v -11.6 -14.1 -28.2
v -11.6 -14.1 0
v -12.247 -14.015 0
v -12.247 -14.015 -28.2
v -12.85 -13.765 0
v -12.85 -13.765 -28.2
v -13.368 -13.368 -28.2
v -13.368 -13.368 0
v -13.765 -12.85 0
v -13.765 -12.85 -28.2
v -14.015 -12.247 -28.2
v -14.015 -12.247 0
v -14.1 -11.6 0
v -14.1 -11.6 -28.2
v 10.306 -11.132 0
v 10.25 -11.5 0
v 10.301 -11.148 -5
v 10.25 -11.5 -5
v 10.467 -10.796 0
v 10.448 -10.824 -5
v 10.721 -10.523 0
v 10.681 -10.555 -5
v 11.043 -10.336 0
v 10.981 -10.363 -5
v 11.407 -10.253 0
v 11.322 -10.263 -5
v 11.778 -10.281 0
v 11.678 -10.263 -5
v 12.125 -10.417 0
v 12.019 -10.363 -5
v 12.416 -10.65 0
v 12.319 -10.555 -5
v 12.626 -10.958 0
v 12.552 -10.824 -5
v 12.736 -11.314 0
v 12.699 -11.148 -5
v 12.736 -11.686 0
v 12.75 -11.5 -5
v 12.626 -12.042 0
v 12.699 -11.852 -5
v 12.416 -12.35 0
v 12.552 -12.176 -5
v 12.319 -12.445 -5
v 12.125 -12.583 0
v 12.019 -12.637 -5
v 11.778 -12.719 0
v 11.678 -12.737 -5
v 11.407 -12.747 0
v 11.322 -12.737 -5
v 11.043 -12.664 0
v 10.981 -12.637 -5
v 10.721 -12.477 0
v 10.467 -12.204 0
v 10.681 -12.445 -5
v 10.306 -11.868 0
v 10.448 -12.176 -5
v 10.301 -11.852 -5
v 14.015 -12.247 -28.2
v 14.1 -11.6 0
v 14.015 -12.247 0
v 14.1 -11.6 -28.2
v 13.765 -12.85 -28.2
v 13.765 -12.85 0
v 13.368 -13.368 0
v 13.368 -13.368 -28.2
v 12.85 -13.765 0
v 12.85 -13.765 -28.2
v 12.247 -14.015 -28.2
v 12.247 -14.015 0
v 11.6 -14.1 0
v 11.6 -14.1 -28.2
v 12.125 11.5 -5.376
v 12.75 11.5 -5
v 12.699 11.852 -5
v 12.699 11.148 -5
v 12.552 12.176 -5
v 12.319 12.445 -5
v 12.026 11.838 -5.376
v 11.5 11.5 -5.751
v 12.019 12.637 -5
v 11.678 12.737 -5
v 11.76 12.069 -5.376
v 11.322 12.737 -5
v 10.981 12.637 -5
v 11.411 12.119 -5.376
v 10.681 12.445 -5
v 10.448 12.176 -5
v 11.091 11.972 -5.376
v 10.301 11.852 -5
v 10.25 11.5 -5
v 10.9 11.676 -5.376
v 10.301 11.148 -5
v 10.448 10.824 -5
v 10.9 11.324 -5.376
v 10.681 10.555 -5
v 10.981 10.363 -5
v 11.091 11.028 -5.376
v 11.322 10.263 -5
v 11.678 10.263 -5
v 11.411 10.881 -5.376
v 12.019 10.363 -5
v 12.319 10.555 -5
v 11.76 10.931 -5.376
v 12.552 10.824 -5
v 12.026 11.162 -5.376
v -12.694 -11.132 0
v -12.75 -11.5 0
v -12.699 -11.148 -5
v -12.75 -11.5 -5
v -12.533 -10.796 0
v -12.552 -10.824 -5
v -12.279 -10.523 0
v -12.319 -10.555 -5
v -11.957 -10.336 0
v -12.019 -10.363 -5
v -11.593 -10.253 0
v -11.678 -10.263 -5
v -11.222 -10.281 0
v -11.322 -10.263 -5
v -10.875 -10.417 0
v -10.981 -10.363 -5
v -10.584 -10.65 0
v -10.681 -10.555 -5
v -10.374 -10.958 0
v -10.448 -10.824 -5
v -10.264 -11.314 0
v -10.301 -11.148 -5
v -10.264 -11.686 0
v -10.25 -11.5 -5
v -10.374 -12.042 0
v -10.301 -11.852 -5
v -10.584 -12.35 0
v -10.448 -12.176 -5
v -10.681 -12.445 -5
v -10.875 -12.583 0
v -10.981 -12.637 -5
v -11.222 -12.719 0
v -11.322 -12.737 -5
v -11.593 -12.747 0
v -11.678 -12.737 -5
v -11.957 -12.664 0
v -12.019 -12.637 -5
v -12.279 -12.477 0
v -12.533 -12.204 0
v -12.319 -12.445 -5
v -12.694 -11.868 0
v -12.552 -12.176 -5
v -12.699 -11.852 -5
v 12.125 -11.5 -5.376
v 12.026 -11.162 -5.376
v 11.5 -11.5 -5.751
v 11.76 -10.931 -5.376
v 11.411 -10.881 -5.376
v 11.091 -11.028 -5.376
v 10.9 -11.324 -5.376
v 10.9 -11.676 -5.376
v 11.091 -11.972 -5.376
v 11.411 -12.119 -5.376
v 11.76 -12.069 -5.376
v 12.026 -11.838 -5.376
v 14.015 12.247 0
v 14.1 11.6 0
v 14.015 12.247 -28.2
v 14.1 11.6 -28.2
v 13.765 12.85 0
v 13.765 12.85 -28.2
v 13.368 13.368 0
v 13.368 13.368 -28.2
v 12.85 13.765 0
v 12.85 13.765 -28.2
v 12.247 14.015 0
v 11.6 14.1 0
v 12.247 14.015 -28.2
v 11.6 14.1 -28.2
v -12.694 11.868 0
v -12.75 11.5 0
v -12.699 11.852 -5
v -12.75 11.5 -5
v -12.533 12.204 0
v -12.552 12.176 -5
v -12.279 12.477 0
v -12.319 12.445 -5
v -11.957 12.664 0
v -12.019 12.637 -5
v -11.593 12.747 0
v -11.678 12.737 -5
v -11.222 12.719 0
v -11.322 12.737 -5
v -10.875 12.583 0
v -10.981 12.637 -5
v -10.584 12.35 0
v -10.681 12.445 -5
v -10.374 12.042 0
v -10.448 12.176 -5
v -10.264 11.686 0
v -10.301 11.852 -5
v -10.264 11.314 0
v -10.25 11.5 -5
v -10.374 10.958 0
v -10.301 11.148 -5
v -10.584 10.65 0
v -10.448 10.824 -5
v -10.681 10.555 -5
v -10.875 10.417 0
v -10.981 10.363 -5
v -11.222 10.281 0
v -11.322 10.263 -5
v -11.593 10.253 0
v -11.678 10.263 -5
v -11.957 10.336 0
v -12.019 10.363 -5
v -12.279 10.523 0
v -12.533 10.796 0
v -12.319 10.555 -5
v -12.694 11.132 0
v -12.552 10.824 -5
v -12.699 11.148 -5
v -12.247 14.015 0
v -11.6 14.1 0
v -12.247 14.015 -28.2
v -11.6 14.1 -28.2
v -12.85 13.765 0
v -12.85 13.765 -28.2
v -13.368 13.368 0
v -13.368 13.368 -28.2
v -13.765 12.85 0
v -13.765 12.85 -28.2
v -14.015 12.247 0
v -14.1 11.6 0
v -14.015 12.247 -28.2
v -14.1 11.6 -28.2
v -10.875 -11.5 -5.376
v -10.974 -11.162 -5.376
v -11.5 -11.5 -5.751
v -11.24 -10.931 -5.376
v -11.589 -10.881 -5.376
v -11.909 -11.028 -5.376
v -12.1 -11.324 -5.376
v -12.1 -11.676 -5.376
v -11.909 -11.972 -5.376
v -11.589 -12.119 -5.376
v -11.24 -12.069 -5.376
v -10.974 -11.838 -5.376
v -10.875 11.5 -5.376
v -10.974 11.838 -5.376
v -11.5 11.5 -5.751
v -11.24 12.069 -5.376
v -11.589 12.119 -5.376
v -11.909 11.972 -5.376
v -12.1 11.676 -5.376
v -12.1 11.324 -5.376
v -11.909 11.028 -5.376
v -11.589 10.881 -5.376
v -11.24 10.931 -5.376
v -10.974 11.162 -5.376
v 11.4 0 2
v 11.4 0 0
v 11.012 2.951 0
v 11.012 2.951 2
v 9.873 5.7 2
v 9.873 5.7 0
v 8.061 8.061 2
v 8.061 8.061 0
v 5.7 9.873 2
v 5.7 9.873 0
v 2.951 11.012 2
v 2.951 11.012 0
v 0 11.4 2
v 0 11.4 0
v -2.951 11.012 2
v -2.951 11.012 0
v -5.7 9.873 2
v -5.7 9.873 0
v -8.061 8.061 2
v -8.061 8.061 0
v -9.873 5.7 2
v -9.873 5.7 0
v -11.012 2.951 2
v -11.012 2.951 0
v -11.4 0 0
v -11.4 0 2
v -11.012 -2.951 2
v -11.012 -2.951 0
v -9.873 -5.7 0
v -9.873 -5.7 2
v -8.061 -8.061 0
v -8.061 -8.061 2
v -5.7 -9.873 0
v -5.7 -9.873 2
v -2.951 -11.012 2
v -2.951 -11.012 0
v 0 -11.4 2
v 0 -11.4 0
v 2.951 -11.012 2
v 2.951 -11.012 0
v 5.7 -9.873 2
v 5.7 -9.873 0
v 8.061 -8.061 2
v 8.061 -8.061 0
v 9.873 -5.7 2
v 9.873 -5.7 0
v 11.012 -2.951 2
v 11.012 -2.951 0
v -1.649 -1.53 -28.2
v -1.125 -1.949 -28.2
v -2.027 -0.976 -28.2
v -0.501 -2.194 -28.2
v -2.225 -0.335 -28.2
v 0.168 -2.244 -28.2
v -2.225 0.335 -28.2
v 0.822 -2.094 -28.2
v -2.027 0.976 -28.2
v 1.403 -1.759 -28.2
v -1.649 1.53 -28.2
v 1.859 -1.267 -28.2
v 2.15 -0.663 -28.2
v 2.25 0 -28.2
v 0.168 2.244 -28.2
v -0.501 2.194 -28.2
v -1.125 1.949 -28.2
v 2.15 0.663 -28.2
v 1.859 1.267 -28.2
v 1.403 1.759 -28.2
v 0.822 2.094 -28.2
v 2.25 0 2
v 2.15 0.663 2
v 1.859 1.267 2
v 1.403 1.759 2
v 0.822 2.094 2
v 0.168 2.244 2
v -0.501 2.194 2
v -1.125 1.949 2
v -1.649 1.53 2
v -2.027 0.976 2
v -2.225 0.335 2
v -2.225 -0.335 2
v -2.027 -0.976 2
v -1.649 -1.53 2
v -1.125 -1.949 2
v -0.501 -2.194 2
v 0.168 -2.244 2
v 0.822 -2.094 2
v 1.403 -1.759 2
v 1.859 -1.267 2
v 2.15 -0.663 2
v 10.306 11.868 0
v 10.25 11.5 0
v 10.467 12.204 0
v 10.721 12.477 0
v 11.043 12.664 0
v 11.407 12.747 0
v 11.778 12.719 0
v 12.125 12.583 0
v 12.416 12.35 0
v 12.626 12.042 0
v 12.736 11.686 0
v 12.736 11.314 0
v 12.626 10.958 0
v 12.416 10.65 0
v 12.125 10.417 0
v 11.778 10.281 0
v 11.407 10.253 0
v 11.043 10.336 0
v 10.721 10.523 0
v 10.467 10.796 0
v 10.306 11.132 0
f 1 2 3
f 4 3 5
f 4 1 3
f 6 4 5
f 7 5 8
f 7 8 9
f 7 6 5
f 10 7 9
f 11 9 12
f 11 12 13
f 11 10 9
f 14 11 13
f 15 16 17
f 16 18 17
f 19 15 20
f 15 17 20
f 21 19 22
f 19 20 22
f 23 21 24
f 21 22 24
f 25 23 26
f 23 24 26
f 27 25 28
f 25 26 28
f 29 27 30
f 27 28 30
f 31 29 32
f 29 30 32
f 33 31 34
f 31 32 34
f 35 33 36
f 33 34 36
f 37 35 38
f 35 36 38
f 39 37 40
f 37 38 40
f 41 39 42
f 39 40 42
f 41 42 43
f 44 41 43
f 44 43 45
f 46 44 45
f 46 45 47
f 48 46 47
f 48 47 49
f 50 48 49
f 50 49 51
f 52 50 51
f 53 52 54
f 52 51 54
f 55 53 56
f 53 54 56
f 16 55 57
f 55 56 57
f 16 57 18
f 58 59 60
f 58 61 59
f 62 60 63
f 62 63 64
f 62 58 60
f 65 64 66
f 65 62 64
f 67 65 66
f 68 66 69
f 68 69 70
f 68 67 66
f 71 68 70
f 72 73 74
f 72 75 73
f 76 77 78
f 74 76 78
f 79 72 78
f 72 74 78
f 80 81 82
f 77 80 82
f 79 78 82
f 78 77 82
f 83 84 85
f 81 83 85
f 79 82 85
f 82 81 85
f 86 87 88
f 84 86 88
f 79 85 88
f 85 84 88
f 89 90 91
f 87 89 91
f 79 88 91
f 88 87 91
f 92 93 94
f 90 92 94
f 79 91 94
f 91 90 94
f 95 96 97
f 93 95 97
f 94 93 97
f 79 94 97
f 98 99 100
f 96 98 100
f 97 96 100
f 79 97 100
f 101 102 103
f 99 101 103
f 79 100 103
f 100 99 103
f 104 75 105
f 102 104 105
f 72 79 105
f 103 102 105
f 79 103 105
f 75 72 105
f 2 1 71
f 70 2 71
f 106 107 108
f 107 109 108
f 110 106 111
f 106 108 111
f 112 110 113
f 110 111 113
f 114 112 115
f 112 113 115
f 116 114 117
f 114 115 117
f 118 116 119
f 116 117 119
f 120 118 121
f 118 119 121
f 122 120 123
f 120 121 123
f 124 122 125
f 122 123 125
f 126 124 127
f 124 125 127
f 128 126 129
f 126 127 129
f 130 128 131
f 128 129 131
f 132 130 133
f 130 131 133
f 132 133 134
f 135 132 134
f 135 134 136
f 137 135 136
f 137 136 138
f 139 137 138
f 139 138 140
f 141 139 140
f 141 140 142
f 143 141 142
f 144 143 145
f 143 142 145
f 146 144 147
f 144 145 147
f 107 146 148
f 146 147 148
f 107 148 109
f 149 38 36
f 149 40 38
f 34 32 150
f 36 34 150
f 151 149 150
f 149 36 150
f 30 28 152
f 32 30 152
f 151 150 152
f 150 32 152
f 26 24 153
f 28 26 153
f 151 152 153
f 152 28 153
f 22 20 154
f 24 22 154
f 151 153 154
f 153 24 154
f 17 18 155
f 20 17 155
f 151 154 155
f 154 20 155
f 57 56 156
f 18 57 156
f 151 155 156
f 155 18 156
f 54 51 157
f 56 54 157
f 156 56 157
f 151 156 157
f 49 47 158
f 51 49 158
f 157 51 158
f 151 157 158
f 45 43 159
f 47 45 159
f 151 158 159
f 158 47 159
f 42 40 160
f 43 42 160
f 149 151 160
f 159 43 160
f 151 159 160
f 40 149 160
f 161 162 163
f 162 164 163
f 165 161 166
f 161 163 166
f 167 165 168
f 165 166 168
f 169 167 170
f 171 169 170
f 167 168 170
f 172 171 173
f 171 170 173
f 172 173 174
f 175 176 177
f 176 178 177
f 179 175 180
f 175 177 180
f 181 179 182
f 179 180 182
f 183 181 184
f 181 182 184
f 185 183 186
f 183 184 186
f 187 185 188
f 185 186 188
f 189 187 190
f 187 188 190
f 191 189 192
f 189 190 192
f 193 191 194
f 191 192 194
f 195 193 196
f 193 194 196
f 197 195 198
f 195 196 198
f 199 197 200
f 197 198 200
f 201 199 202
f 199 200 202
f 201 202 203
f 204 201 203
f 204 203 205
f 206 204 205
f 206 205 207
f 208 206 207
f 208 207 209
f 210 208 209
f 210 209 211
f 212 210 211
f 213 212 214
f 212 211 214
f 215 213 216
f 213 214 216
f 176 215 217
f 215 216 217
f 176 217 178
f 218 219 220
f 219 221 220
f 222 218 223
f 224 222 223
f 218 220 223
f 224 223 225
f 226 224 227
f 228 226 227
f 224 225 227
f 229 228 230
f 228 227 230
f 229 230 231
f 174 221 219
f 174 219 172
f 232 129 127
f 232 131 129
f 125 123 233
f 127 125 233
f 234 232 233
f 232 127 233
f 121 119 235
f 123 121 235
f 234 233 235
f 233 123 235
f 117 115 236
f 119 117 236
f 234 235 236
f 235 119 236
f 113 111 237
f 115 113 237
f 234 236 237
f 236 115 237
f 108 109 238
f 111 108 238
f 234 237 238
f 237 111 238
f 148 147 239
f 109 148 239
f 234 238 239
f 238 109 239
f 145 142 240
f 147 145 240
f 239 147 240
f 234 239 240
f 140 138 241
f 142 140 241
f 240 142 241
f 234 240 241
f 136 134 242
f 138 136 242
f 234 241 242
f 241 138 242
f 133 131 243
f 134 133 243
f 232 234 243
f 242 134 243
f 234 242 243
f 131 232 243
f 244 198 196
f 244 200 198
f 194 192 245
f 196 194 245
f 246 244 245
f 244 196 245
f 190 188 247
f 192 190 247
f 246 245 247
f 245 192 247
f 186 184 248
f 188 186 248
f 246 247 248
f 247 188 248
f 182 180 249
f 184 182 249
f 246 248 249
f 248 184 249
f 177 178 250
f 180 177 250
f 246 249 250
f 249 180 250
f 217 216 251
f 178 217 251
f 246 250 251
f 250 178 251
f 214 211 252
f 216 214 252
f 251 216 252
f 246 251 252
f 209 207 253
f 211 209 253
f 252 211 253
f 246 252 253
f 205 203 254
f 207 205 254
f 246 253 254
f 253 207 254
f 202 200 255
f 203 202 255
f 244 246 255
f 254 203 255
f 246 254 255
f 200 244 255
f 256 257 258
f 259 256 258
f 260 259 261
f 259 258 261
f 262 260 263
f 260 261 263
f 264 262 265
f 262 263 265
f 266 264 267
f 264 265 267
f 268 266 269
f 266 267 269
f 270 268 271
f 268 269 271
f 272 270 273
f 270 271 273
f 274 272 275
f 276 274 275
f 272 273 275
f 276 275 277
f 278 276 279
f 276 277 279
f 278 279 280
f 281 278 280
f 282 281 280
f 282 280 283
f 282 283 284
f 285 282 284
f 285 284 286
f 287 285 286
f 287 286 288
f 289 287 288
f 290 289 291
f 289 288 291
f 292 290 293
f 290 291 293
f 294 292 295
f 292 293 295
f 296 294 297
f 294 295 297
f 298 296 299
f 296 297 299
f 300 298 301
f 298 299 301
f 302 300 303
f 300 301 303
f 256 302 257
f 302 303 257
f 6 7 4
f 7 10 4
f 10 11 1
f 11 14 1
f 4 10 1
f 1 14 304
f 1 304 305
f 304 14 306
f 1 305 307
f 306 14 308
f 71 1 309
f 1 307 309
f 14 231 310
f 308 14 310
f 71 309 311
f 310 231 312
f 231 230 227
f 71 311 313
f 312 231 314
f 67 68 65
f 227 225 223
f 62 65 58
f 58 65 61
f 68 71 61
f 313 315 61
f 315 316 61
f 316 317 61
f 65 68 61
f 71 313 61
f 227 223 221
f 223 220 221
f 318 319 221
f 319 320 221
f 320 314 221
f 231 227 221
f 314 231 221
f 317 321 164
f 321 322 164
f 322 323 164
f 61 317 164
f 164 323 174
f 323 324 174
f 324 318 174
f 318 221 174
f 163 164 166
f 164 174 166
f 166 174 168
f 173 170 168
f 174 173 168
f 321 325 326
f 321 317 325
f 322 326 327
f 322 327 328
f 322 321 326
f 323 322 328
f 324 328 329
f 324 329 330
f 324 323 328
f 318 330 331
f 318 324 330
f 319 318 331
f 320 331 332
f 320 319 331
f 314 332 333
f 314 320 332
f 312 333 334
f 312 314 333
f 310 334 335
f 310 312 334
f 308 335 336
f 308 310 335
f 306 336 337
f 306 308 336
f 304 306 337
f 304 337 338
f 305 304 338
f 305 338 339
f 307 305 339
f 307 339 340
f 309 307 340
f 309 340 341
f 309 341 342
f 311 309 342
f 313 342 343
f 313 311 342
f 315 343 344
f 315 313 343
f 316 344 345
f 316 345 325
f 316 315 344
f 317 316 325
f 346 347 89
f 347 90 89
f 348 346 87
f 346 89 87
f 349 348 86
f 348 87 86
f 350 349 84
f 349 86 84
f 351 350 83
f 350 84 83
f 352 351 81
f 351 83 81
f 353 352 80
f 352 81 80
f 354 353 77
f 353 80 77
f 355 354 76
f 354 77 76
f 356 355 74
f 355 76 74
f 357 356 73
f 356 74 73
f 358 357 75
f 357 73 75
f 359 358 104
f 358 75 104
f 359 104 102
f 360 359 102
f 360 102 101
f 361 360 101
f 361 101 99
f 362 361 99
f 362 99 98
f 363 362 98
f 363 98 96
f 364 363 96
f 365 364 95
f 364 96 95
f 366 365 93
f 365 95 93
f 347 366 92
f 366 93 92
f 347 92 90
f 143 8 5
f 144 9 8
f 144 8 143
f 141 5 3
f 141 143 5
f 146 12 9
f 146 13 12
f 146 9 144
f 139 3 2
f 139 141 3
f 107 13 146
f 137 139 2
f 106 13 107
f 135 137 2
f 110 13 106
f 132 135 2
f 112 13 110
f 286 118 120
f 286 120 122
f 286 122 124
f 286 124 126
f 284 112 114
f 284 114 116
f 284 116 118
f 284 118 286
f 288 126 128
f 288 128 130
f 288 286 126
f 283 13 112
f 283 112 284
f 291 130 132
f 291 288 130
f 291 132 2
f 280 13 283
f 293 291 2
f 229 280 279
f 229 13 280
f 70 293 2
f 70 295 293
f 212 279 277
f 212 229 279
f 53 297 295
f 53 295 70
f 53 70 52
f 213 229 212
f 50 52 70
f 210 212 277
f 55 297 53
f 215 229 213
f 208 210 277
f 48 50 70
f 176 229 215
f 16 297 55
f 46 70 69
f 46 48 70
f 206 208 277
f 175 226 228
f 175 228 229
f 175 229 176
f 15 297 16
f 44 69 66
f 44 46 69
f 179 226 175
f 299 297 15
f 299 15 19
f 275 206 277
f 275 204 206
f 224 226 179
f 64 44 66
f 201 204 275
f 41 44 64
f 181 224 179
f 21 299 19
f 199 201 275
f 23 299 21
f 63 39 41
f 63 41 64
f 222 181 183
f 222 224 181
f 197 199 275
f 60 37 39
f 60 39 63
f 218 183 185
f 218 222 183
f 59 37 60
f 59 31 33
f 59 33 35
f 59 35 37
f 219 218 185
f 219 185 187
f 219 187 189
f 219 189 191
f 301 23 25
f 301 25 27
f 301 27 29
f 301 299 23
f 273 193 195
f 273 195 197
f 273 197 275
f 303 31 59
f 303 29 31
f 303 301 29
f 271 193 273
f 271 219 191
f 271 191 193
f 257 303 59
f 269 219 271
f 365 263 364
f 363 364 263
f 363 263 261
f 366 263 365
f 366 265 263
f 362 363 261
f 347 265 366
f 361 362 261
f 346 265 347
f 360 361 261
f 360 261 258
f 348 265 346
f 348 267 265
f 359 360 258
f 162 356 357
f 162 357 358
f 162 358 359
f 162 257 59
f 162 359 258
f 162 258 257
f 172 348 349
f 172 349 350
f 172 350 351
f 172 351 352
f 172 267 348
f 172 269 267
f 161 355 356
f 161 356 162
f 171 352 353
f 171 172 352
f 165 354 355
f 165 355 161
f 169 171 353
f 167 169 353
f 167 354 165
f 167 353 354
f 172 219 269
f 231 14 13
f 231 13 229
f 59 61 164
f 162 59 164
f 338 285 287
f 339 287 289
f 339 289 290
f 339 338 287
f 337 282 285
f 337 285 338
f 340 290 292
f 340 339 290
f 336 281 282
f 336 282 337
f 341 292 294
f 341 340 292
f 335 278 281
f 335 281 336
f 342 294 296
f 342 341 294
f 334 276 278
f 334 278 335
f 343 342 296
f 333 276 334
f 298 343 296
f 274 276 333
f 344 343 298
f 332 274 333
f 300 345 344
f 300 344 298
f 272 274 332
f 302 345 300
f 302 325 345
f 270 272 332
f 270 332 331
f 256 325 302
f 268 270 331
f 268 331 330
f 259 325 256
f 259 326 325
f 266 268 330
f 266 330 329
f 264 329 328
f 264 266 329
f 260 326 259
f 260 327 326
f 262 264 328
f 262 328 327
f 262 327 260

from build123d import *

# Parameters (mm, degrees)
F0_W     = 28.2
F0_H     = 28.2
F0_R     = 11.4
F0_R_2   = 2.25
F1_DEPTH = 28.2
F2_DEPTH = 2
F3_R     = 2.5
F5_D     = 2.5
F5_DEPTH = 5
F5_TIP   = 0.7510757738


with BuildPart() as f1:
    # F0 (on Top) → F1 (new body)
    with BuildSketch(Plane.XY):
        Rectangle(F0_W, F0_H)
        Circle(F0_R, mode=Mode.SUBTRACT)
        Circle(F0_R)
        Circle(F0_R_2, mode=Mode.SUBTRACT)
    extrude(amount=-F1_DEPTH)

    # F0 (on Top) → F2 (join)
    with BuildSketch(Plane.XY):
        Circle(F0_R)
        Circle(F0_R_2, mode=Mode.SUBTRACT)
    extrude(amount=F2_DEPTH)

    # F3
    f3_edges = [f1.edges().sort_by_distance(p)[0] for p in [
        (-14.1, -14.1, -14.1),
        (14.1, -14.1, -14.1),
        (-14.1, 14.1, -14.1),
        (14.1, 14.1, -14.1),
    ]]
    fillet(f3_edges, radius=F3_R)

    # F5
    with Locations(Plane.XY):
        with Locations((-11.5, 11.5), (11.5, 11.5), (11.5, -11.5), (-11.5, -11.5)):
            Hole(F5_D / 2, depth=F5_DEPTH)
            with Locations((0, 0, -(F5_DEPTH + F5_TIP / 2))):  # 118° drill point
                Cone(0, F5_D / 2, F5_TIP, mode=Mode.SUBTRACT)


solid = f1.part
